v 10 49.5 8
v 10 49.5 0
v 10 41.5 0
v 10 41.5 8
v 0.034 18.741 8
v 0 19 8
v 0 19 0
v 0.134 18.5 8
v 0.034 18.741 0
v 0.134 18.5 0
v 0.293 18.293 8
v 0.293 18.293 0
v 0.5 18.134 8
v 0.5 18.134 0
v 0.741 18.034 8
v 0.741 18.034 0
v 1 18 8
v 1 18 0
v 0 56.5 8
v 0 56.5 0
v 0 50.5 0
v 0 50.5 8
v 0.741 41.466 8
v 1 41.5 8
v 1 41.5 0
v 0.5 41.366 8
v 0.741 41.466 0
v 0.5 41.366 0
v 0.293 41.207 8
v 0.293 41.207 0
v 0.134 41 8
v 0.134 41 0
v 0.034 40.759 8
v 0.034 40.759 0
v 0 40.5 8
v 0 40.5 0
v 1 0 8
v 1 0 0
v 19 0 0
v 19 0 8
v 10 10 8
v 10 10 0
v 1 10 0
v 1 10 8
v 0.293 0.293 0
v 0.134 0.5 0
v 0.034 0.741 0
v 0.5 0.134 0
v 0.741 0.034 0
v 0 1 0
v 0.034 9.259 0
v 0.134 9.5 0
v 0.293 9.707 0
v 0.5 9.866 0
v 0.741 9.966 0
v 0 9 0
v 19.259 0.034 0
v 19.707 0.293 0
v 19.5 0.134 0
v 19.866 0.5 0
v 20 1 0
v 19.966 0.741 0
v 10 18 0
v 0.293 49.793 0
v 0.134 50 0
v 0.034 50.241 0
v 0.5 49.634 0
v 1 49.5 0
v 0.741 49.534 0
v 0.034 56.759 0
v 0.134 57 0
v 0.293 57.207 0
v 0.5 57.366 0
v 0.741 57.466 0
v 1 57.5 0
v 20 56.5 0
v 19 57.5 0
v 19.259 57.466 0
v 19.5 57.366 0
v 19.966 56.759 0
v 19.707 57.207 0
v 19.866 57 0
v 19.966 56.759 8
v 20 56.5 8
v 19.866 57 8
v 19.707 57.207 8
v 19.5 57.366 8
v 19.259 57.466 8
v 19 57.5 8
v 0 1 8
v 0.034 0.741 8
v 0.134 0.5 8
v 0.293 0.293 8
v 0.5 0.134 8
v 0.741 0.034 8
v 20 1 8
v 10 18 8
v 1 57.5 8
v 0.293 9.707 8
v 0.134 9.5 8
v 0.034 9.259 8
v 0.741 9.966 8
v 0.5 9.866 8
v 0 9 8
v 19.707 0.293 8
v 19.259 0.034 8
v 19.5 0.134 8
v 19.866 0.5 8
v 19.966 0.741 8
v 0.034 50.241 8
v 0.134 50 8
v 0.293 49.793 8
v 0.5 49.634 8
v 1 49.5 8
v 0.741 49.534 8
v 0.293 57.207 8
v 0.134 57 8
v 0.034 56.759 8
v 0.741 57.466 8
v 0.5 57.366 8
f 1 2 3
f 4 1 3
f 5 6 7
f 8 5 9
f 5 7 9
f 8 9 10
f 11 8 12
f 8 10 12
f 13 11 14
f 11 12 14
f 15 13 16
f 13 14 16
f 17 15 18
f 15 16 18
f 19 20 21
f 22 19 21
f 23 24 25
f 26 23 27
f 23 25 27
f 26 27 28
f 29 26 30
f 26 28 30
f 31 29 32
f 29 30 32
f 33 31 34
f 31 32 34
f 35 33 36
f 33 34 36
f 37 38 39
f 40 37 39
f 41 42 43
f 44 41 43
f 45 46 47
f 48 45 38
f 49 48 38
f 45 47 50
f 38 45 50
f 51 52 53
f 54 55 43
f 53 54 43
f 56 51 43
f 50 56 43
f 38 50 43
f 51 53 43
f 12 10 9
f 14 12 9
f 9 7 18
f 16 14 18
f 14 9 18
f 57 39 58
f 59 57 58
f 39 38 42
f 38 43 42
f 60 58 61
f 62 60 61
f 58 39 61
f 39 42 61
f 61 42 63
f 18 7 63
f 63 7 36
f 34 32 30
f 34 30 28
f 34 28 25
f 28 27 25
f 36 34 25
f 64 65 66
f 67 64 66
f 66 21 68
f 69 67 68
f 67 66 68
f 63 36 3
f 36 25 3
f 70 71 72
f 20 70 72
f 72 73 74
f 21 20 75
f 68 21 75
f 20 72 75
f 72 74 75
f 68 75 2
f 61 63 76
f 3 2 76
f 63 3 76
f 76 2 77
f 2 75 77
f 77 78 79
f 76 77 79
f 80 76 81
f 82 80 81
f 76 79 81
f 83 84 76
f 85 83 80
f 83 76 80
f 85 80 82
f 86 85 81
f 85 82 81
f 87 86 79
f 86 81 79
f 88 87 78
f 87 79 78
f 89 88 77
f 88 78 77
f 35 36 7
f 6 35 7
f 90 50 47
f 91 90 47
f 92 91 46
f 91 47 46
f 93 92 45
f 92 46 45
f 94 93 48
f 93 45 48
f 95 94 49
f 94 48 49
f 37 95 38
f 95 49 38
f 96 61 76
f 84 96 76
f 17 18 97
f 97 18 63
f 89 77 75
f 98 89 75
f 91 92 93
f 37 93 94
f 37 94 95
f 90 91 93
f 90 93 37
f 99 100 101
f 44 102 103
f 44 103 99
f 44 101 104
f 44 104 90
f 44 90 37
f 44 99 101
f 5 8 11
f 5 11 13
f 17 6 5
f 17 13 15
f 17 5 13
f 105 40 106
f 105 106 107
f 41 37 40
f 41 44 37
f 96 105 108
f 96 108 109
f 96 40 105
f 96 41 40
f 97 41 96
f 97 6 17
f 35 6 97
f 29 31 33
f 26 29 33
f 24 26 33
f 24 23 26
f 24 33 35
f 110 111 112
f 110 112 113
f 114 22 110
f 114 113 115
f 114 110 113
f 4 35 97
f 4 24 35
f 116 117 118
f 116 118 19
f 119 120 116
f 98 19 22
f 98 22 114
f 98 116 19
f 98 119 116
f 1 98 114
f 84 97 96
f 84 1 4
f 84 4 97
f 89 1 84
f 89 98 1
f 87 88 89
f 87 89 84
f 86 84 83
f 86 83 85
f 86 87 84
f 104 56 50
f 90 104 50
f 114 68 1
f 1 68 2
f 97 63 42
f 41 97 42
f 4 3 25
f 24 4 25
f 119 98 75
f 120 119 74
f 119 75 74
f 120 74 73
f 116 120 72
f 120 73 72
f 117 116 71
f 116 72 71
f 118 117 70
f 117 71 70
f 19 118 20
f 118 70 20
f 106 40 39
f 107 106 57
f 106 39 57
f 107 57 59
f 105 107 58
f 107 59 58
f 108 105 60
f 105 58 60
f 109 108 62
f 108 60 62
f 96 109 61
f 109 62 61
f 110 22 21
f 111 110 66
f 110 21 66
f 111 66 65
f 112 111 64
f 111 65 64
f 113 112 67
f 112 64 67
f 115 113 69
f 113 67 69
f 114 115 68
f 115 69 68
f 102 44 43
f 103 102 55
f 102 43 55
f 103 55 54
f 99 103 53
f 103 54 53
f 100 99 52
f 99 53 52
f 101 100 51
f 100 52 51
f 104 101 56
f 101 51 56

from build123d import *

# Parameters (mm, degrees)
BOSS_EXTRUDE1_DEPTH = 8


with BuildPart() as part:
    # Sketch1 → Boss-Extrude1 (new body)
    with BuildSketch(Plane.XY):
        with BuildLine():
            Line((1, 0), (19, 0))
            ThreePointArc((19, 0), (19.707106781, 0.292893219), (20, 1))
            Line((20, 1), (20, 56.5))
            ThreePointArc((20, 56.5), (19.707106781, 57.207106781), (19, 57.5))
            Line((19, 57.5), (1, 57.5))
            ThreePointArc((1, 57.5), (0.292893219, 57.207106781), (0, 56.5))
            Line((0, 56.5), (0, 50.5))
            ThreePointArc((0, 50.5), (0.292893219, 49.792893219), (1, 49.5))
            Line((1, 49.5), (10, 49.5))
            Line((10, 49.5), (10, 41.5))
            Line((10, 41.5), (1, 41.5))
            ThreePointArc((1, 41.5), (0.292893219, 41.207106781), (0, 40.5))
            Line((0, 40.5), (0, 19))
            ThreePointArc((0, 19), (0.292893219, 18.292893219), (1, 18))
            Line((1, 18), (10, 18))
            Line((10, 18), (10, 10))
            Line((10, 10), (1, 10))
            ThreePointArc((1, 10), (0.292893219, 9.707106781), (0, 9))
            Line((0, 9), (0, 1))
            ThreePointArc((0, 1), (0.292893219, 0.292893219), (1, 0))
        make_face()
    extrude(amount=BOSS_EXTRUDE1_DEPTH)


solid = part.part
